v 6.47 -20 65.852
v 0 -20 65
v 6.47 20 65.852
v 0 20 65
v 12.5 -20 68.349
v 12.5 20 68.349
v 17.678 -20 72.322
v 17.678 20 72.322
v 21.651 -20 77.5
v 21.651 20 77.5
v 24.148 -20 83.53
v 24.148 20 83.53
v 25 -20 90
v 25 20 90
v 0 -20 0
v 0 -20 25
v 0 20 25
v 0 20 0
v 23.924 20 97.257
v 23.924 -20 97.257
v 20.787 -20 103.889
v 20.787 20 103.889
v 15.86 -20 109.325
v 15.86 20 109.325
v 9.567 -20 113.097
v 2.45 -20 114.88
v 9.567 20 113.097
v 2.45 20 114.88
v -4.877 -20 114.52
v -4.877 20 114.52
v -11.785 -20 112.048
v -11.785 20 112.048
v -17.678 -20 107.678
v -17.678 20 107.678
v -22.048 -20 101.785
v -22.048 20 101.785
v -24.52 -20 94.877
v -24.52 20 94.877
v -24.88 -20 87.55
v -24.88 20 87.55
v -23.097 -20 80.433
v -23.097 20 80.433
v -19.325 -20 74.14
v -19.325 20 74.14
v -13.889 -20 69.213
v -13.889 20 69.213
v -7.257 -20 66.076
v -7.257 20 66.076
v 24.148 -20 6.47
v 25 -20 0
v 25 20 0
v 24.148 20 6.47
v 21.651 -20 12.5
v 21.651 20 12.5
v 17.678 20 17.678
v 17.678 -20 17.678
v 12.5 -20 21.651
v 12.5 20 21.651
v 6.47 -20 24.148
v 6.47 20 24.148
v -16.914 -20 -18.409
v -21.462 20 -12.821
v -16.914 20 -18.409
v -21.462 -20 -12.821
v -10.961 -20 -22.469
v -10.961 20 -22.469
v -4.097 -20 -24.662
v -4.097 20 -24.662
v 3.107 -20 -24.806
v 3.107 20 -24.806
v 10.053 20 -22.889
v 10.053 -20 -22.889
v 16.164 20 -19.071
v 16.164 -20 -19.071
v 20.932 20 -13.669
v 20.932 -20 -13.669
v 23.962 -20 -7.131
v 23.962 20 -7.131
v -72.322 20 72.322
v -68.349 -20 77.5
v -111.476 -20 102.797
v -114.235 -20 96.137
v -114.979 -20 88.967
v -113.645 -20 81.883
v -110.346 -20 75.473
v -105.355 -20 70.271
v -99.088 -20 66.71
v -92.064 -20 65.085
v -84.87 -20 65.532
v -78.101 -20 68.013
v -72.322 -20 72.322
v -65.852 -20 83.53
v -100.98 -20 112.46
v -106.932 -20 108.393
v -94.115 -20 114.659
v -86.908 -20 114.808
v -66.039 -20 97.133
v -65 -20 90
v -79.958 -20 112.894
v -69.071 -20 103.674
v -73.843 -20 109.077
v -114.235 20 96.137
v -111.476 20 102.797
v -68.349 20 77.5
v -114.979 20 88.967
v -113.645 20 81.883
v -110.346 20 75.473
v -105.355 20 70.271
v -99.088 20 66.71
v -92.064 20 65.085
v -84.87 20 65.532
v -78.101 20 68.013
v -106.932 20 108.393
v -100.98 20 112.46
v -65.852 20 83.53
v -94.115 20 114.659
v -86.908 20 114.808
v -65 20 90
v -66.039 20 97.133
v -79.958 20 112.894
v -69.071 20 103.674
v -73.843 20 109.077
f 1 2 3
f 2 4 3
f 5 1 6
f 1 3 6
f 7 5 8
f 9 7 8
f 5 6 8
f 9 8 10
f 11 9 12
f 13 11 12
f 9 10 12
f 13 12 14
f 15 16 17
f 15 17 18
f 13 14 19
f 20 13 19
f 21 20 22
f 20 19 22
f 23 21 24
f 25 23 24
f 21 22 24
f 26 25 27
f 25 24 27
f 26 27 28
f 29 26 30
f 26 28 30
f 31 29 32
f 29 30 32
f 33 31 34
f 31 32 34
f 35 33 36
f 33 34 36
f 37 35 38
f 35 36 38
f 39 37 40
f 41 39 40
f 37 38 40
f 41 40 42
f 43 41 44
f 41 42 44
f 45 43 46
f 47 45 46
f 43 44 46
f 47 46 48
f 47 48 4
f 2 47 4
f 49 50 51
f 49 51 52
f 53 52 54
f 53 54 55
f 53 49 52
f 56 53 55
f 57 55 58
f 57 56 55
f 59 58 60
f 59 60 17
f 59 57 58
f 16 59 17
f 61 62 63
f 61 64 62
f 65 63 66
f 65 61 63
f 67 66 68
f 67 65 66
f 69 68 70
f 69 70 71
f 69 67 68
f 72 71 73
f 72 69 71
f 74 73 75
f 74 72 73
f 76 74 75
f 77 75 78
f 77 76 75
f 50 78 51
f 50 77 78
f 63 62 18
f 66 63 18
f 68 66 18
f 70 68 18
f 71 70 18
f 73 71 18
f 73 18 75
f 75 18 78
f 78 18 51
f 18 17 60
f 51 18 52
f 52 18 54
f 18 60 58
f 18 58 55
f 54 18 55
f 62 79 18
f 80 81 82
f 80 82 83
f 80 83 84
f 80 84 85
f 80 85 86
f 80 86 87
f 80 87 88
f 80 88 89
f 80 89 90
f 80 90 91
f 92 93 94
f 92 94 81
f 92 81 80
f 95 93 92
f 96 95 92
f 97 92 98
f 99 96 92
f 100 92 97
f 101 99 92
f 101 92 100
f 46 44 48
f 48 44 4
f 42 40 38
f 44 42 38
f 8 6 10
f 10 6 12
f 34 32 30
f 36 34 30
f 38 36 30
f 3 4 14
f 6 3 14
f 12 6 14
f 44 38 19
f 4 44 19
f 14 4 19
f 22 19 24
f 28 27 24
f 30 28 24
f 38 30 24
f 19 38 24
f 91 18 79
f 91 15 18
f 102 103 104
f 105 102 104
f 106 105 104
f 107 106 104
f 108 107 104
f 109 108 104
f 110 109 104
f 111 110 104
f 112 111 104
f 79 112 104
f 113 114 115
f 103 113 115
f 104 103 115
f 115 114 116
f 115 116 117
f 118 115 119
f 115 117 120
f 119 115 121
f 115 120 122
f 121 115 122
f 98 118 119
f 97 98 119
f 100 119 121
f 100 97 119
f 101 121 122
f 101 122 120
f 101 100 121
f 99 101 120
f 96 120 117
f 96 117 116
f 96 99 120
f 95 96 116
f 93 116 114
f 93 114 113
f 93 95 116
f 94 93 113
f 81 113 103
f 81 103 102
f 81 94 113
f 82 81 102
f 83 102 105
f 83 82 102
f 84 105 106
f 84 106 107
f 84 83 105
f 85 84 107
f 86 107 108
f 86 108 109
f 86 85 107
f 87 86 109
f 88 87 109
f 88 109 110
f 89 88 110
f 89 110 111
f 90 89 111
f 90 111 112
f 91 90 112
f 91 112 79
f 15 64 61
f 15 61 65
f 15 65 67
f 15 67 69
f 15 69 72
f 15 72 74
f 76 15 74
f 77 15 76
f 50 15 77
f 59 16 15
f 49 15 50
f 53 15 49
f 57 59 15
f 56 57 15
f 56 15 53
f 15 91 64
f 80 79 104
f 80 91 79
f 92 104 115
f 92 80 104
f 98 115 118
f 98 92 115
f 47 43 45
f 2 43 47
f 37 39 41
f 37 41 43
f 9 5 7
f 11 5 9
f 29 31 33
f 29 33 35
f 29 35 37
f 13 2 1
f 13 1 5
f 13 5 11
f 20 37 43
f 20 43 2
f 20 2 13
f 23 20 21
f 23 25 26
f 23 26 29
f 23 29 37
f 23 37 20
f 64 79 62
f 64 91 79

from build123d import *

# Parameters (mm, degrees)
F1_DEPTH = 20


with BuildPart() as f1:
    # F0 (on Front) → F1 (new body, symmetric)
    with BuildSketch(Plane.XZ):
        with BuildLine():
            ThreePointArc((-65, 90), (-113.096988, 99.567086), (-72.32233, 72.32233))
            ThreePointArc((-72.32233, 72.32233), (-66.903012, 80.432914), (-65, 90))
        make_face()
        with BuildLine():
            ThreePointArc((25, 90), (-17.67767, 107.67767), (0, 65))
            ThreePointArc((0, 65), (17.67767, 72.32233), (25, 90))
        make_face()
        with BuildLine():
            ThreePointArc((-17.67767, 17.67767), (-24.809696, 3.078798), (-21.46239, -12.820523))
            ThreePointArc((-21.46239, -12.820523), (6.649821, -24.099375), (25, 0))
            ThreePointArc((25, 0), (17.67767, 17.67767), (0, 25))
            Line((0, 25), (0, 0))
            Line((0, 0), (-17.67767, 17.67767))
        make_face()
        with BuildLine():
            Line((-72.32233, 72.32233), (-21.46239, -12.820523))
            ThreePointArc((-21.46239, -12.820523), (-24.809696, 3.078798), (-17.67767, 17.67767))
            Line((-17.67767, 17.67767), (-72.32233, 72.32233))
        make_face()
    extrude(amount=F1_DEPTH, both=True)


solid = f1.part
